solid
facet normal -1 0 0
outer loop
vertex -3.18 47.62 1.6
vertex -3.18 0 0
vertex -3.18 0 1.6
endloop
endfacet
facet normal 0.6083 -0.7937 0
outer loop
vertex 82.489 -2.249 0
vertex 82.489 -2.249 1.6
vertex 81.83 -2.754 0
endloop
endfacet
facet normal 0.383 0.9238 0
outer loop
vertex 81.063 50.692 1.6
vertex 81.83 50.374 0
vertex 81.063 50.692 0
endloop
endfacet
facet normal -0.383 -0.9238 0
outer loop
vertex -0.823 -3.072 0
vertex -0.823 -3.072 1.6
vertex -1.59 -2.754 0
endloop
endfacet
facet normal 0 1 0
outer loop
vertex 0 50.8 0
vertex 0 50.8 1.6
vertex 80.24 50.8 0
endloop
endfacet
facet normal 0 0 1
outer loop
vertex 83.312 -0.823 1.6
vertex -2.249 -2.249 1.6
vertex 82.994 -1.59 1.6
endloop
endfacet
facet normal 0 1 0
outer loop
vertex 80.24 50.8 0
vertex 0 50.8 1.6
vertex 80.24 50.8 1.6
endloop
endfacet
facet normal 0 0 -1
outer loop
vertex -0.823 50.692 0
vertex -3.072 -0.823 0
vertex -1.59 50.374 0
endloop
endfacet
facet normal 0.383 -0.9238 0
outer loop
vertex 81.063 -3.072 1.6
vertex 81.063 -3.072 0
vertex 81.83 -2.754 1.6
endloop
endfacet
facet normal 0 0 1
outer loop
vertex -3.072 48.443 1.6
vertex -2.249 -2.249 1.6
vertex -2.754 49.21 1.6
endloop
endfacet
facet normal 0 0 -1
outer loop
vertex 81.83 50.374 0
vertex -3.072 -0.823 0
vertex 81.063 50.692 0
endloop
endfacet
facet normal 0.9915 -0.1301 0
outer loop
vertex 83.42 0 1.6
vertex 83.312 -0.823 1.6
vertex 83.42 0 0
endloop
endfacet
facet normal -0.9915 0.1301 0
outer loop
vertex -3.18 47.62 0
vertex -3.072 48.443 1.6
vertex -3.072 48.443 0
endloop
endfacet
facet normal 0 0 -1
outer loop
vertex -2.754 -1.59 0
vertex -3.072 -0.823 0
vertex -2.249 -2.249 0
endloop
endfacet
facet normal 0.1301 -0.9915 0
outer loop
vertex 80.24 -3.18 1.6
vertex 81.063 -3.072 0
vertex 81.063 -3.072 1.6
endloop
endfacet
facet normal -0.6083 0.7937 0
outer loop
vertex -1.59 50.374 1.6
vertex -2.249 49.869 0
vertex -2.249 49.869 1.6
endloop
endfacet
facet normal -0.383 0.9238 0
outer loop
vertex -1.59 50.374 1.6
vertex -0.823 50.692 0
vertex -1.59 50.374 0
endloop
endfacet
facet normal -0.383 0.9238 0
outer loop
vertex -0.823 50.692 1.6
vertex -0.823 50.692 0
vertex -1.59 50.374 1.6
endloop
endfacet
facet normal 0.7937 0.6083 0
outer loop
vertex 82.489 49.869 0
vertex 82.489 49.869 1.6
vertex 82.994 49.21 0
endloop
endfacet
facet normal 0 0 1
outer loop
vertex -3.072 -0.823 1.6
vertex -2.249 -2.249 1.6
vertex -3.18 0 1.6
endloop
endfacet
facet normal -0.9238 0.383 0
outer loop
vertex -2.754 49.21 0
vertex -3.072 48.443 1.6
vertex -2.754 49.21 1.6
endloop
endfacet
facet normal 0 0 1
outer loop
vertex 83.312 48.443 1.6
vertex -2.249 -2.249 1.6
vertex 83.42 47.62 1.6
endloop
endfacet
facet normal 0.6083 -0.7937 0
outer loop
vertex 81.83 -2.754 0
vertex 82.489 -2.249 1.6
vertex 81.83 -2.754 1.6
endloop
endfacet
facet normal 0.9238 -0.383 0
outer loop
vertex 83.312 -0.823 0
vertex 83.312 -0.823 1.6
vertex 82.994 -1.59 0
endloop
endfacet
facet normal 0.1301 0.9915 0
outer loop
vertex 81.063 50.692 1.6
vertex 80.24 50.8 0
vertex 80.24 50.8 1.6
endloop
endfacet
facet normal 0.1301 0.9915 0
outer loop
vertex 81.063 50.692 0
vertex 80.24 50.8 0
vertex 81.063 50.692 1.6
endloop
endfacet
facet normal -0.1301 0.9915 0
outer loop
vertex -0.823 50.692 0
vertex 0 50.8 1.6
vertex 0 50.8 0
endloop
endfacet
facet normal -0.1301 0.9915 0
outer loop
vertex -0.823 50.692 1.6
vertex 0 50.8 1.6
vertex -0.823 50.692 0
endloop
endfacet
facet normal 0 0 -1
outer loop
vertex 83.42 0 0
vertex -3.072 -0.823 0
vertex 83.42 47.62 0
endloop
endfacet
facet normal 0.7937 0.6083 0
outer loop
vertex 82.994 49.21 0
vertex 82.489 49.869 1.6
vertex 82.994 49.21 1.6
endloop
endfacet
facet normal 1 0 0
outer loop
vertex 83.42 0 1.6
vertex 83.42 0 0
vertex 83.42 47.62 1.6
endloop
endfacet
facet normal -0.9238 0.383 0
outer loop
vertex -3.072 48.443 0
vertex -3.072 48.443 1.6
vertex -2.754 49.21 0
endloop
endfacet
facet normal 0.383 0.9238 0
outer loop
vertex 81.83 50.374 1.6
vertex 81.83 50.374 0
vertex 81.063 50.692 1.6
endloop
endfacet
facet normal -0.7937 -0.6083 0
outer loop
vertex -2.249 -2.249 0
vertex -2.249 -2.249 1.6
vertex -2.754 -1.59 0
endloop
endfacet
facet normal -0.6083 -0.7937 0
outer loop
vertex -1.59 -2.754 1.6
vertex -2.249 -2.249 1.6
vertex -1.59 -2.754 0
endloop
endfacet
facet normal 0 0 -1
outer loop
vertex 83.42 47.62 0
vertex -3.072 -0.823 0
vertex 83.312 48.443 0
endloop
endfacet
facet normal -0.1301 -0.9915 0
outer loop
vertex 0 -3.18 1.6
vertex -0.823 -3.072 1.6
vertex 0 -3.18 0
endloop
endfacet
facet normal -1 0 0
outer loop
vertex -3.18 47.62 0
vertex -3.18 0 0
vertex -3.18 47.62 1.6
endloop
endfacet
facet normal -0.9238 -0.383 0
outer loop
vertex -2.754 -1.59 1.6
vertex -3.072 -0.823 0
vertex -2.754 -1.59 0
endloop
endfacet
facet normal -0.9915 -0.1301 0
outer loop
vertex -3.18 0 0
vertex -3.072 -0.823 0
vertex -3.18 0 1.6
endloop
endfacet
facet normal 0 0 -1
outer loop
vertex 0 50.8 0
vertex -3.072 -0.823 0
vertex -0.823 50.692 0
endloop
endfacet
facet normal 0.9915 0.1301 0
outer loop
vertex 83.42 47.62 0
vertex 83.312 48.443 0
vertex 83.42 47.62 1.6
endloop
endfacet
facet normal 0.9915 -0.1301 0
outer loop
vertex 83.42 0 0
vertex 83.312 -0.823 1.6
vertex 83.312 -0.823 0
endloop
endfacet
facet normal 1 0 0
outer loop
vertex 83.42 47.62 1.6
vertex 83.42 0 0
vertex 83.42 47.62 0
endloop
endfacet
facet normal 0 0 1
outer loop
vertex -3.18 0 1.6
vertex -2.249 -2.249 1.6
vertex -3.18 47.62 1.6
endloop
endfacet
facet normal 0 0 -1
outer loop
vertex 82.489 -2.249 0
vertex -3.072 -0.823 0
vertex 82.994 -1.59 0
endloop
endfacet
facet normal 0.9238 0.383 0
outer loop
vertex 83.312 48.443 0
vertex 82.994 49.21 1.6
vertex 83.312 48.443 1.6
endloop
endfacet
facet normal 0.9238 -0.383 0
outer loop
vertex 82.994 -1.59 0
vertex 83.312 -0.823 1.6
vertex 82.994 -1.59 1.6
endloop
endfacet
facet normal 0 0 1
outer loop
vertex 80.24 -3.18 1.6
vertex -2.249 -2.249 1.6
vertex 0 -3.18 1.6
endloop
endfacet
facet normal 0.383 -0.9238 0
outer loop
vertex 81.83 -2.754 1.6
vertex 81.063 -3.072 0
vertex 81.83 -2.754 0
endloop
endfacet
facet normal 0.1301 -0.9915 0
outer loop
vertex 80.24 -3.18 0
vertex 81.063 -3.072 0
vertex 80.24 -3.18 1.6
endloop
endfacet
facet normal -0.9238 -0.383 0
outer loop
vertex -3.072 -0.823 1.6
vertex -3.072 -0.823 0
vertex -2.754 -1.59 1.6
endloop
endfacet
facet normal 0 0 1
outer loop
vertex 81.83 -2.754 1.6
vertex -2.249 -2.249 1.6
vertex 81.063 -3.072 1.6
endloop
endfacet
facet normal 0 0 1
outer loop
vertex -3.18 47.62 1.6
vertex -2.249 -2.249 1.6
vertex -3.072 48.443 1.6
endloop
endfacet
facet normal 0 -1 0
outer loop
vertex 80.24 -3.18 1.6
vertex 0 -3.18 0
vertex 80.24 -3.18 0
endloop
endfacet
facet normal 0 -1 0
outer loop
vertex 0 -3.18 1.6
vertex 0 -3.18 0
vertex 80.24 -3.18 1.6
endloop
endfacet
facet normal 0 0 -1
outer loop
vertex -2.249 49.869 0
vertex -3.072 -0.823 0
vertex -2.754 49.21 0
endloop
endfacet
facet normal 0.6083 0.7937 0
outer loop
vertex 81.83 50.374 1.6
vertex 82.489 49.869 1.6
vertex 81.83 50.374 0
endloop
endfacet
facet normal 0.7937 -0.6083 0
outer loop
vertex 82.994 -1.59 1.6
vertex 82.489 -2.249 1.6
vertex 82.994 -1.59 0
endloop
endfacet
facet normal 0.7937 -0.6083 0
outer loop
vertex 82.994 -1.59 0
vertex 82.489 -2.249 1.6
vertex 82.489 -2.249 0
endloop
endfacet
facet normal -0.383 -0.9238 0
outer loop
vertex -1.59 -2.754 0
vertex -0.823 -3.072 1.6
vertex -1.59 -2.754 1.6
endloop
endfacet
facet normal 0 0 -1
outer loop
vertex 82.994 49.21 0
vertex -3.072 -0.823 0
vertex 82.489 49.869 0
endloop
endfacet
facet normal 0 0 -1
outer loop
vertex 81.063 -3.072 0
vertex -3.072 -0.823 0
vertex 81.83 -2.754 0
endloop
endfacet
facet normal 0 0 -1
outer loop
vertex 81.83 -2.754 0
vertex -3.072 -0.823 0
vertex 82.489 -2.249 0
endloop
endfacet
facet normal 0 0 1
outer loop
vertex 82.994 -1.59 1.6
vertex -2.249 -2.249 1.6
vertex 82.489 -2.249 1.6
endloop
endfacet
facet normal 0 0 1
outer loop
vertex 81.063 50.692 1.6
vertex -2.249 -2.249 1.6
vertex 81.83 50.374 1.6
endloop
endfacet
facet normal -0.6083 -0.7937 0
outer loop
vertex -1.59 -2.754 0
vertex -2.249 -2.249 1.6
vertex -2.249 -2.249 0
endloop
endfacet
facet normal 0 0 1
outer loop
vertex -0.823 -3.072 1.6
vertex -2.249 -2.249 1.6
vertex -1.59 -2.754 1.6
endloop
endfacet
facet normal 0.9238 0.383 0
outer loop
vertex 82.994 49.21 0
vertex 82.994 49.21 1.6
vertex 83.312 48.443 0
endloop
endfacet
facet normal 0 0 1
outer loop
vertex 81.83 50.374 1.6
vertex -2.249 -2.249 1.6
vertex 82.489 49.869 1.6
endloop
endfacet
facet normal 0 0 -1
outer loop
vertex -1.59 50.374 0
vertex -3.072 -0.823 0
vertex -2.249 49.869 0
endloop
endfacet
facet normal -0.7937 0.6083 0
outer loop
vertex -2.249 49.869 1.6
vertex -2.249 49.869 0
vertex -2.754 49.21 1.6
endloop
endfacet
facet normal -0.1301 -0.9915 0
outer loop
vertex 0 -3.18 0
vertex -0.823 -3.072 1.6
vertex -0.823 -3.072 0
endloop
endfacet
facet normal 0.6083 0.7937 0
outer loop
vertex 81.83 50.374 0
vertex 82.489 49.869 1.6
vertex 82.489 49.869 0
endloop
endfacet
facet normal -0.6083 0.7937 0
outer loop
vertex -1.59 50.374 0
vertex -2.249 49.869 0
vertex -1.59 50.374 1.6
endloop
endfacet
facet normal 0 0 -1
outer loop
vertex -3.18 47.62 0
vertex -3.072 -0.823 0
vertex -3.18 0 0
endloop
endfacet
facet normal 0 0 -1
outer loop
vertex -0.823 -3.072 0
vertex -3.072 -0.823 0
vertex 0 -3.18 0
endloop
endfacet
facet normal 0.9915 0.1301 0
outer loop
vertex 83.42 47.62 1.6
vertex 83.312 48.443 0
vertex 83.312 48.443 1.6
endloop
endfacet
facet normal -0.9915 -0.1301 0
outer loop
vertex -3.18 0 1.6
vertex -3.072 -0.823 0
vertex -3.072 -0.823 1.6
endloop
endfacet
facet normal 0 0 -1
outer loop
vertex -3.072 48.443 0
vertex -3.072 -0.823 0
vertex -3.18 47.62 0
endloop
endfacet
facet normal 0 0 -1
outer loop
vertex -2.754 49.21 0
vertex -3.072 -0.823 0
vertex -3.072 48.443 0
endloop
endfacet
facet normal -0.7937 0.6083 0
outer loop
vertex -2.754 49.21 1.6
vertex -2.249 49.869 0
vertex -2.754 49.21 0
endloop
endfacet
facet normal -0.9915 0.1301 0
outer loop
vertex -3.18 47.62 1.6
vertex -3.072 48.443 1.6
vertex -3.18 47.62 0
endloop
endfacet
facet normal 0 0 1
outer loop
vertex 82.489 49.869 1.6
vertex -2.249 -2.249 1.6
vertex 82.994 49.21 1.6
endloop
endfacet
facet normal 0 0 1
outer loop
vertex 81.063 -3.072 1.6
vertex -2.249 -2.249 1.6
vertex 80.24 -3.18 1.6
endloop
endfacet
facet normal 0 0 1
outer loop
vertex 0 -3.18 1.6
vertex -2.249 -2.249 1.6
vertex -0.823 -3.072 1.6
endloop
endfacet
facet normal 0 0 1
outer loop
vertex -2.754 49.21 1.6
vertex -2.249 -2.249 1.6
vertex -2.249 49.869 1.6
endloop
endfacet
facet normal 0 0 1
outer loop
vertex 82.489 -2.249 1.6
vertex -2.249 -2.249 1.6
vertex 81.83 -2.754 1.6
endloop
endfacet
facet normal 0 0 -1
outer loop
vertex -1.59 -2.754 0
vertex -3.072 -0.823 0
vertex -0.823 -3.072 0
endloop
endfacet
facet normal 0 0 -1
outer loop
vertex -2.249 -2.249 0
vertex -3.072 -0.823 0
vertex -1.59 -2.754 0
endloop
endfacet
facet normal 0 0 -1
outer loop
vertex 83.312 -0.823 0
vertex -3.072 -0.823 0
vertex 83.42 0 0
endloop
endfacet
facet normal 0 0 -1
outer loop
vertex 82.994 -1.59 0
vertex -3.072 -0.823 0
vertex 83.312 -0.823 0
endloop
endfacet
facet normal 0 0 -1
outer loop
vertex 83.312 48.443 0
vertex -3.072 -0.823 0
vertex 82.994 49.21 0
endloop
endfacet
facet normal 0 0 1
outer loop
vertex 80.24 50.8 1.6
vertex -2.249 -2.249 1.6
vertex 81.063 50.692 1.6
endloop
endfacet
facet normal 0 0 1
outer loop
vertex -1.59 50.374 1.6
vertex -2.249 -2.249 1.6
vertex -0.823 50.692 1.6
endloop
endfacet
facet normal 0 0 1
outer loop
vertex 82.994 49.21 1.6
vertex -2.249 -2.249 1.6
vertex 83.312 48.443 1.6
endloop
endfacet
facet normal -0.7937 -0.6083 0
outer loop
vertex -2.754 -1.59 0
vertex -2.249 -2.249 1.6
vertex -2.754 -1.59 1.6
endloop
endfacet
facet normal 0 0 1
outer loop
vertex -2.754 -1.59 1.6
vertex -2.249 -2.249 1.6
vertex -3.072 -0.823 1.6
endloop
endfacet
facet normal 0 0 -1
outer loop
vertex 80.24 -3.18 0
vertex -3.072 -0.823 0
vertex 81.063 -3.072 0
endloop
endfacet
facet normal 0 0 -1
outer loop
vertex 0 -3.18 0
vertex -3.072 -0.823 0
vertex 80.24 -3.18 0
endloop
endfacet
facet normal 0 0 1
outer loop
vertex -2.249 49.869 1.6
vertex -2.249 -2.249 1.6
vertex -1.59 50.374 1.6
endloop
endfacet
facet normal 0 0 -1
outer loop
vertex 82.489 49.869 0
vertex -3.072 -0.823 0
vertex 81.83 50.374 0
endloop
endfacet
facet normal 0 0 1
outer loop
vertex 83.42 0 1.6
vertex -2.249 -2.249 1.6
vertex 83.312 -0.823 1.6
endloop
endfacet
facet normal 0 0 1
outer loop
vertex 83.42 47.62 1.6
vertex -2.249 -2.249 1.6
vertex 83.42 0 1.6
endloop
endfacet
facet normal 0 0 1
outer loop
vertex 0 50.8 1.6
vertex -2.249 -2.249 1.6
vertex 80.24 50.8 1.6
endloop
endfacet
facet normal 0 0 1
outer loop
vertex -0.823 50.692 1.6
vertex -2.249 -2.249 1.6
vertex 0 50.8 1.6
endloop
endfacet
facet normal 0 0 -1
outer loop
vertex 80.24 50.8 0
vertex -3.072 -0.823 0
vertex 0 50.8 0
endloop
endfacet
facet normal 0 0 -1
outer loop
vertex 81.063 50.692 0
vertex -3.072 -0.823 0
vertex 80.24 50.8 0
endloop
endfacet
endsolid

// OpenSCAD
// essenskarte_paul

$fn = $preview ? 16 : 24;

l = 86.6;
b = 53.98;
h = 0.8;
mk = 3.18 * 2;
f = 1.01;

difference (){
    union () {
        minkowski () 
        {
            cube([l - mk, b - mk, h]);
            cylinder(h=h, d=mk);
        }
    }
}
